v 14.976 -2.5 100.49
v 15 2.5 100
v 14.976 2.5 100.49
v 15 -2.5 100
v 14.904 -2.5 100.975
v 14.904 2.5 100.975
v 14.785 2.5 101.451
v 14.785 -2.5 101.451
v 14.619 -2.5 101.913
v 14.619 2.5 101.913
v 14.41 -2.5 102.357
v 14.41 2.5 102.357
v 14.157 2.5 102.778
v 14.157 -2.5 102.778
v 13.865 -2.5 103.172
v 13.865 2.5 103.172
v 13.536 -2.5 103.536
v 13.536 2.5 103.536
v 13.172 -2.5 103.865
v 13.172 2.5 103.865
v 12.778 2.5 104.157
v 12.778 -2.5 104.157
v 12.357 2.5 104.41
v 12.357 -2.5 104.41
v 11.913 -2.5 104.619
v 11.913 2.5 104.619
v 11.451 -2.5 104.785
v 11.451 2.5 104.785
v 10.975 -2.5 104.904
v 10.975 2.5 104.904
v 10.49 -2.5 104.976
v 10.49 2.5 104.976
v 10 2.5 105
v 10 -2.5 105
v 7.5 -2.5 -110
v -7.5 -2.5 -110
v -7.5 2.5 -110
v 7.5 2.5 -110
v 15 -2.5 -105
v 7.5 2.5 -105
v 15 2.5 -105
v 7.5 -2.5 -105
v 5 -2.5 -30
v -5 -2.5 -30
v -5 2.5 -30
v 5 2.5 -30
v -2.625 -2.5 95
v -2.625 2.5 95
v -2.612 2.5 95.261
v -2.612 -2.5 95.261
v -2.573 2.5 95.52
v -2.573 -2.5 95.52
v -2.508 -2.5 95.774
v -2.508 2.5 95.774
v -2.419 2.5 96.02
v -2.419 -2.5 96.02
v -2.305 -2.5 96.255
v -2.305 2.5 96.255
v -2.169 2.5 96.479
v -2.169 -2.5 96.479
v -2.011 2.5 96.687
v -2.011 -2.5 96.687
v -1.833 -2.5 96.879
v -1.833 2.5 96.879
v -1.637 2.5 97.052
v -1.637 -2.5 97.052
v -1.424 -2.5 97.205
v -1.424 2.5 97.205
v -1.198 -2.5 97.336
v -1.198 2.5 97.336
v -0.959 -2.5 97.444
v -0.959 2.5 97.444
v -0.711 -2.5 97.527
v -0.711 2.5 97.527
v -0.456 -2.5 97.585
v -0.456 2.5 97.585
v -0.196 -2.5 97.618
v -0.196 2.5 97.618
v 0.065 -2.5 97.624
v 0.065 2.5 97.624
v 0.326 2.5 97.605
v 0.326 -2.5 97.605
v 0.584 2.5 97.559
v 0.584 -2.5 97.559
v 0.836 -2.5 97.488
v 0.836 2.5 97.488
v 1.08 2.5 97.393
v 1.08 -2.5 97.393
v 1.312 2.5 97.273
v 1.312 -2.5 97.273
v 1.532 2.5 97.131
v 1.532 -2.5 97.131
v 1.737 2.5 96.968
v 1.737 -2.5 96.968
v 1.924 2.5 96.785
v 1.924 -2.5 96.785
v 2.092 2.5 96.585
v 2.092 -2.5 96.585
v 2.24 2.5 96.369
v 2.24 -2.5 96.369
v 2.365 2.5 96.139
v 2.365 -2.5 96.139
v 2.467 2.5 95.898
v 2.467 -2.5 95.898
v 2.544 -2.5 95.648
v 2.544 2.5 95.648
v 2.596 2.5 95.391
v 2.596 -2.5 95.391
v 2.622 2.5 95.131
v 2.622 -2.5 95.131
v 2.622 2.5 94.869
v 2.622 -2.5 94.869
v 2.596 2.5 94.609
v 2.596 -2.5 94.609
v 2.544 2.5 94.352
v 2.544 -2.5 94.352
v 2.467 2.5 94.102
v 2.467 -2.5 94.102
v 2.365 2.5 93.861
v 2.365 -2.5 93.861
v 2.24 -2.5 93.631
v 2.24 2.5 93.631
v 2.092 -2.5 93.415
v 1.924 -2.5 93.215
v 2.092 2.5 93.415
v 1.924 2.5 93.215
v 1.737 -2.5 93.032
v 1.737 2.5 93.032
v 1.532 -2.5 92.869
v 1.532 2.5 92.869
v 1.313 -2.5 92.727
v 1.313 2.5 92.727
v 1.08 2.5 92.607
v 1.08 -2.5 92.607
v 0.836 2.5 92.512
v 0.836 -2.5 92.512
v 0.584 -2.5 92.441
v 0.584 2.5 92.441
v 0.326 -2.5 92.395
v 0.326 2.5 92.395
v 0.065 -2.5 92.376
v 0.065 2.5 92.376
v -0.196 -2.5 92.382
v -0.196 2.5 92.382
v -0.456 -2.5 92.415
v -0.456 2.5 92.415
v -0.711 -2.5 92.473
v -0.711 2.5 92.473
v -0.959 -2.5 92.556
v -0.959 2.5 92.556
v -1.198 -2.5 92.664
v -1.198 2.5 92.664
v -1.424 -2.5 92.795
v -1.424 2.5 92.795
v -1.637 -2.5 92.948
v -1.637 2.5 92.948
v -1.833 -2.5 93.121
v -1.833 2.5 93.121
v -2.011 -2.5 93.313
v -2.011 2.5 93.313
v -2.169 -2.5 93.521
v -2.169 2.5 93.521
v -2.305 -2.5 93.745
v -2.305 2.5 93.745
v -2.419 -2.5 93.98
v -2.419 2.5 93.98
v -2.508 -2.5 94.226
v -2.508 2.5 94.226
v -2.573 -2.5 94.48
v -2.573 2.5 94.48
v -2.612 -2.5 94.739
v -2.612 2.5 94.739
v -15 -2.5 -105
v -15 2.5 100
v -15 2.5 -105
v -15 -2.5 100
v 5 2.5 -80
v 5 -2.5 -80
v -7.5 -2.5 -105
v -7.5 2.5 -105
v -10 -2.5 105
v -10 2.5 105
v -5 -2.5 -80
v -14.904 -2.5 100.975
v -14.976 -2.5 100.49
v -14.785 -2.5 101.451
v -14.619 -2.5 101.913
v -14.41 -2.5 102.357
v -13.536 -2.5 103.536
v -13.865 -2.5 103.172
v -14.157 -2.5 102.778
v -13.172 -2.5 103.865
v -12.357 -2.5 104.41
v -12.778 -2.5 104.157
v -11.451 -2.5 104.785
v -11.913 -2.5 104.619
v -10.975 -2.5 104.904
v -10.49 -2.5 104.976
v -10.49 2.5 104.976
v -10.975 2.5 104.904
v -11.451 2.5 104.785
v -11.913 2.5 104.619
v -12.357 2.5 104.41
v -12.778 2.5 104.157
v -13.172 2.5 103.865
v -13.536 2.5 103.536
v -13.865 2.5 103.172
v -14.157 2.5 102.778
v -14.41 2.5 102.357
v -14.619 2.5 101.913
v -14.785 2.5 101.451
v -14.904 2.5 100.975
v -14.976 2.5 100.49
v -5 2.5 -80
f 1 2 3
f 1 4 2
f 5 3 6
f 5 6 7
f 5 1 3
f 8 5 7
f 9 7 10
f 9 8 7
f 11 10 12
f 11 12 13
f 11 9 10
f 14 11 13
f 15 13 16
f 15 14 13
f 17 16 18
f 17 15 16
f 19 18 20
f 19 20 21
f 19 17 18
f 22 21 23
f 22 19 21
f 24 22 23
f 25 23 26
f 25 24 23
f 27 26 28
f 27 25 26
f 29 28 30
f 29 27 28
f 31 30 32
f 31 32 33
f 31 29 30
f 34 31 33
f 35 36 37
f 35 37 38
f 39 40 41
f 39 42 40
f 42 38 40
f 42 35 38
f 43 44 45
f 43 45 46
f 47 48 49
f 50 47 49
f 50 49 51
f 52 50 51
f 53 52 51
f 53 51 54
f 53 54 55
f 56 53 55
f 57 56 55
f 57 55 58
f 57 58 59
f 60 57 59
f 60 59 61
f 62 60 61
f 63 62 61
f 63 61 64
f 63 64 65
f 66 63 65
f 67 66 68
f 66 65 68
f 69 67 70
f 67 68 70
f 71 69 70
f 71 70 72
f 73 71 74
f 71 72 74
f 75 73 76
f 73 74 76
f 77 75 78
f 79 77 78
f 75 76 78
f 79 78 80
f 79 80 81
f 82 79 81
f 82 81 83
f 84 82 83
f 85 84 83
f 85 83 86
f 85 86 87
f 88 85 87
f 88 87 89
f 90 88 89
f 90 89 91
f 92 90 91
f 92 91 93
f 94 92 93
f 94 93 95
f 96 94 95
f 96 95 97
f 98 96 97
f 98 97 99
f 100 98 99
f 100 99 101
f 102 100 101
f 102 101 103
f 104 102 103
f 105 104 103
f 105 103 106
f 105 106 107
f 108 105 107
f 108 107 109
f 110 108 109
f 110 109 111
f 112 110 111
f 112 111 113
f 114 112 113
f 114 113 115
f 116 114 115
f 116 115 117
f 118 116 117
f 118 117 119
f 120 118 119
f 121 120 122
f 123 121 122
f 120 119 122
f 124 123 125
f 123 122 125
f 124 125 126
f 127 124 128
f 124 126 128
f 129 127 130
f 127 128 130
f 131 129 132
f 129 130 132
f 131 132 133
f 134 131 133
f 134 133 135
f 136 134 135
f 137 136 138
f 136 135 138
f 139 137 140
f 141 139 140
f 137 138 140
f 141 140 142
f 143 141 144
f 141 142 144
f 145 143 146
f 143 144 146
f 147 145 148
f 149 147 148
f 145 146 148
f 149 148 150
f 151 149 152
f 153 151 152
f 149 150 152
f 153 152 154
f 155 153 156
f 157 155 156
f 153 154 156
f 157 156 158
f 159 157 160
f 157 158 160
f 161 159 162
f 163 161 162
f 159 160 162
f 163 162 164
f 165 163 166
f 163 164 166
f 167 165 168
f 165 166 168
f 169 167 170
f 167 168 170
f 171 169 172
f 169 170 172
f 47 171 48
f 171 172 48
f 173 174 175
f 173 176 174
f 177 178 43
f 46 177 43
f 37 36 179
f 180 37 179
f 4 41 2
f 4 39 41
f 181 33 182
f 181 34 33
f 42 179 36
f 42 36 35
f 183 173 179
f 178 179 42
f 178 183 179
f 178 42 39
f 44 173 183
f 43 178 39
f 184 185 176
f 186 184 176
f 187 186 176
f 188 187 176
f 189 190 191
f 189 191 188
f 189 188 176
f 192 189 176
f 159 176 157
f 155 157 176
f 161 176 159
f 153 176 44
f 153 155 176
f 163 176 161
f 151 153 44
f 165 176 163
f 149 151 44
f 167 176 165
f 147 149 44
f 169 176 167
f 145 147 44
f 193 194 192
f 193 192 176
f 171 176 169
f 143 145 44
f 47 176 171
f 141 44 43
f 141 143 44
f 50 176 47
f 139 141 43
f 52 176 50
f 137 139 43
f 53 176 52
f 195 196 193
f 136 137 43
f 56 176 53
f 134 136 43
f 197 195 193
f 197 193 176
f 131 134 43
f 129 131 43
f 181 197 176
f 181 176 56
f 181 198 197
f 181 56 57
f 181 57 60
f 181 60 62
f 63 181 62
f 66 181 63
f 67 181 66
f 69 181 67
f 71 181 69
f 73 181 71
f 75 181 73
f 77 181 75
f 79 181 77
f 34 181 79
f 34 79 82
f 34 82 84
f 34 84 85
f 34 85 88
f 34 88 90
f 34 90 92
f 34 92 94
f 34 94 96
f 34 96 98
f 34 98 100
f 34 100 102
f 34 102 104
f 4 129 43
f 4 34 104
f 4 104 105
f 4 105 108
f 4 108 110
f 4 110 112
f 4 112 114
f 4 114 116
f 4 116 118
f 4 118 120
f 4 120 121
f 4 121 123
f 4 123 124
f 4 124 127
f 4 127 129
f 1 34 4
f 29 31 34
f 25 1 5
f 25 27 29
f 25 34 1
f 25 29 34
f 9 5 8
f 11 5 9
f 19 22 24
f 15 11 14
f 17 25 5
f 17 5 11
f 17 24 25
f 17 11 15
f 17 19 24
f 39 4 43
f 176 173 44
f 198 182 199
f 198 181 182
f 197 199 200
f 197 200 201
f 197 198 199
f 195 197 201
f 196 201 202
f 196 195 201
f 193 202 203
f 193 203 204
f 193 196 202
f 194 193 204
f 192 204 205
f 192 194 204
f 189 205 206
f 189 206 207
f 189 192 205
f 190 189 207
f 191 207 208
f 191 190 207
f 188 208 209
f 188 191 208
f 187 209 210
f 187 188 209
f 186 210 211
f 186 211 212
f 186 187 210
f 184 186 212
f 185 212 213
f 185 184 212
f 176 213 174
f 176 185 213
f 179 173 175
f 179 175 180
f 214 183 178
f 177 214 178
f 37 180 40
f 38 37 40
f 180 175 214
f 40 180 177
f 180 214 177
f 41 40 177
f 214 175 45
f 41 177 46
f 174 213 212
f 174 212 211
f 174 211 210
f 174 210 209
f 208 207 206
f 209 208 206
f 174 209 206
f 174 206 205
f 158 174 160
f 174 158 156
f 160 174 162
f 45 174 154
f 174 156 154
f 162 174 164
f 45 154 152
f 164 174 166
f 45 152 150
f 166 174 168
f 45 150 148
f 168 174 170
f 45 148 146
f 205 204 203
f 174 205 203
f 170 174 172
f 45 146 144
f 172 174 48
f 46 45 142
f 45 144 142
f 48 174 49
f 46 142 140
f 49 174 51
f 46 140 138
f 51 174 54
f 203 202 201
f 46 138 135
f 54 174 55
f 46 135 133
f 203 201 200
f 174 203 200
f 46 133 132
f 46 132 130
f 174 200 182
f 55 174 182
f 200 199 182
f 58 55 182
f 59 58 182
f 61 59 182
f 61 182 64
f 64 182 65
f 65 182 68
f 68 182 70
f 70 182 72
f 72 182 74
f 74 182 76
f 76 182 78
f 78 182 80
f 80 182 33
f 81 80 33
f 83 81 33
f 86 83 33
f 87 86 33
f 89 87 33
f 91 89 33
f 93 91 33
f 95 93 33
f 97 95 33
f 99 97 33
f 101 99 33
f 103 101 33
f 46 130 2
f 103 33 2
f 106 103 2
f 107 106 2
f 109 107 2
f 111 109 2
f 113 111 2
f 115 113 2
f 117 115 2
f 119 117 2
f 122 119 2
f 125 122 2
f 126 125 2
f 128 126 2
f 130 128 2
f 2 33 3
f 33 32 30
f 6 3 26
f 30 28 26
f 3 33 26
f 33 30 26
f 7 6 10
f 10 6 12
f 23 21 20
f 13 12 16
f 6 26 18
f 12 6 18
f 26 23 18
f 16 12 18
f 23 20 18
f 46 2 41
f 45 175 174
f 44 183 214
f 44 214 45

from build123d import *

# Parameters (mm, degrees)
F0_W     = 15
F0_H     = 5
F1_DEPTH = 2.5
F3_D     = 5.25
F4_R     = 5
F5_W     = 10
F5_H     = 50
F6_DEPTH = 10


with BuildPart() as f1:
    # F0 (on Front) → F1 (new body, symmetric)
    with BuildSketch(Plane.XZ):
        Polygon((15, -105), (15, 105), (-15, 105), (-15, -105), (-7.5, -105), (-7.5, -100), (7.5, -100), (7.5, -105), align=None)
        with Locations((0, -107.5)):
            Rectangle(F0_W, F0_H)
        with Locations((0, -102.5)):
            Rectangle(F0_W, F0_H)
    extrude(amount=F1_DEPTH, both=True)

    # F3 (through all)
    with Locations(Plane.XZ.offset(2.5)):
        with Locations((0, 95)):
            Hole(F3_D / 2)

    # F4
    f4_edges = [f1.edges().sort_by_distance(p)[0] for p in [
        (15, 0, 105),
        (-15, 0, 105),
    ]]
    fillet(f4_edges, radius=F4_R)

    # F5 (on face) → F6 (cut)
    with BuildSketch(Plane.XZ.offset(2.5)):
        with Locations((0, -55)):
            Rectangle(F5_W, F5_H)
    extrude(amount=-F6_DEPTH, mode=Mode.SUBTRACT)


solid = f1.part
